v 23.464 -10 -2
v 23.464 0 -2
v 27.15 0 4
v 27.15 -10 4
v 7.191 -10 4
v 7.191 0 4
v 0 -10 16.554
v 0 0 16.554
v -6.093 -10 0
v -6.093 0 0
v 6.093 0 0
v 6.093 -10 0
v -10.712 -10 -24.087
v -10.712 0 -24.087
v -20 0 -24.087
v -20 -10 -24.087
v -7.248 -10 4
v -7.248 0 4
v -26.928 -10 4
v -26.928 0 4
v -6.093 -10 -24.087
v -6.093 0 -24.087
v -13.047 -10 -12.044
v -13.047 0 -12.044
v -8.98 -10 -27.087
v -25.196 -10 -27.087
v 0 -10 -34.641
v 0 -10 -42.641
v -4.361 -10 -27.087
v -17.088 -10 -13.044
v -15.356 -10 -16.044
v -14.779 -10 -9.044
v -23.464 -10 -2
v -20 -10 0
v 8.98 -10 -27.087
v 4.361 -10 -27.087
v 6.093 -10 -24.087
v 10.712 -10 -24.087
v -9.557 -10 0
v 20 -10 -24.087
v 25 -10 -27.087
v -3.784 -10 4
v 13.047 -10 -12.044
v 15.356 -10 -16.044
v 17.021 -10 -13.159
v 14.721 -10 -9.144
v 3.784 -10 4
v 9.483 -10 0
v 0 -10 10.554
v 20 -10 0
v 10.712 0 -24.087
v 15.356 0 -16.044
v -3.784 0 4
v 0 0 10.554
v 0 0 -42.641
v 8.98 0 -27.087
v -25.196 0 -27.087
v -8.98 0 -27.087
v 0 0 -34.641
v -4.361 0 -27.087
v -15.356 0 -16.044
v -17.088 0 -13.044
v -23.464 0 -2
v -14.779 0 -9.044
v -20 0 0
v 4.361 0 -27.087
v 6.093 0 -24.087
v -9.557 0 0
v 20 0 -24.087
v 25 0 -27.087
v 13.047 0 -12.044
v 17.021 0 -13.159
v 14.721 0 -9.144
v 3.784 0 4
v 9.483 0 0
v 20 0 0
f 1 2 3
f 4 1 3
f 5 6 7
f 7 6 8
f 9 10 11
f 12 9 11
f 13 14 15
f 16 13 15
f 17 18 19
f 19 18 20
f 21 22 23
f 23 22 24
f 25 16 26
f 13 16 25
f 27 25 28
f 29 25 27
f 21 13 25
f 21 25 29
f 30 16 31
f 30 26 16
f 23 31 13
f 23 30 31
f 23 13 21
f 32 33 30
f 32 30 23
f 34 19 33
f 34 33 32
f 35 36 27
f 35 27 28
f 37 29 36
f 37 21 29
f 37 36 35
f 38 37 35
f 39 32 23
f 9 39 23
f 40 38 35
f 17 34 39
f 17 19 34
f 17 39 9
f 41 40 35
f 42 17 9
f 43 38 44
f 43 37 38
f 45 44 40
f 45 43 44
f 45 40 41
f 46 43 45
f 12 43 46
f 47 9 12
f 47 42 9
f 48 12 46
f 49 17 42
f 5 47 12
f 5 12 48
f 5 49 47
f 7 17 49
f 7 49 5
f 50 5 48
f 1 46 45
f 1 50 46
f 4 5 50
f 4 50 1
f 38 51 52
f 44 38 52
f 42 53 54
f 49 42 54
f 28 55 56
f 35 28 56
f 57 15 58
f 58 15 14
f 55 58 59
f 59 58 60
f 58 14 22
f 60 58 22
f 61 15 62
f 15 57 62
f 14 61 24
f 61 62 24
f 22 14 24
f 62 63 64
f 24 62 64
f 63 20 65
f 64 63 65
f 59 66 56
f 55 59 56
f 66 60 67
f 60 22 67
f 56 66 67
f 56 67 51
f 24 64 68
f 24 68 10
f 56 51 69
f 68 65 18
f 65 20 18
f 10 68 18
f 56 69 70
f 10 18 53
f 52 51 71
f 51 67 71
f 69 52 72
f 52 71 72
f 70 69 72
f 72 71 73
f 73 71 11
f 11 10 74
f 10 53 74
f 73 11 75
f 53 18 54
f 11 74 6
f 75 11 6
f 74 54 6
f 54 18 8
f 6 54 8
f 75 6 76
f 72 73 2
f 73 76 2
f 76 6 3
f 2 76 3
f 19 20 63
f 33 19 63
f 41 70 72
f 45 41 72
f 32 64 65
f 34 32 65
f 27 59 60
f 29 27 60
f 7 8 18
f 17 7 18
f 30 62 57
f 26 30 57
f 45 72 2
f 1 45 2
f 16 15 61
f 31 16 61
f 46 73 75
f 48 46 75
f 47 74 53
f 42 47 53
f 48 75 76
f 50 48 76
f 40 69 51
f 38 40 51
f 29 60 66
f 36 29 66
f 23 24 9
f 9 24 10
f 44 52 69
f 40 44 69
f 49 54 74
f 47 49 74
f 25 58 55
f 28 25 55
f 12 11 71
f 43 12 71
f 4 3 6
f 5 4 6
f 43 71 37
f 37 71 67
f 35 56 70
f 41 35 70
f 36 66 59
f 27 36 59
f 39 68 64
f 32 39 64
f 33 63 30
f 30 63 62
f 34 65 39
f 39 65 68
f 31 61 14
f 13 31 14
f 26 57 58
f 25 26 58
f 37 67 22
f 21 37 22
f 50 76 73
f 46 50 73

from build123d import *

# Parameters (mm, degrees)
F1_DEPTH = 10


with BuildPart() as f1:
    # F0 (on Front) → F1 (new body)
    with BuildSketch(Plane.XZ):
        Polygon((-10.7119849175, -24.0873143706), (-6.0931825641, -24.0873143706), (-13.046591282, -12.0436571853), (-15.3559924588, -16.0436573585), align=None)
        Polygon((4.3611317565, -27.0873143706), (0, -34.6410161514), (-4.3611317565, -27.0873143706), (-8.9799341099, -27.0873143706), (0, -42.6410164977), (8.9799341099, -27.0873143706), align=None)
        Polygon((13.046591282, -12.0436571853), (6.0931825641, -24.0873143706), (10.7119849175, -24.0873143706), (15.3559924588, -16.0436573585), align=None)
        Polygon((20, 0), (14.7208913197, -9.143684453), (17.0212680072, -13.1593155), (23.4641017651, -2.0000000866), (27.1496195346, 4.00000019), (20, 4.00000019), (7.1914581155, 4.00000019), (9.4828805792, 0), align=None)
        Polygon((-3.7837813776, 4.00000019), (-6.0931825641, 0), (6.0931825641, 0), (3.7837813776, 4.00000019), align=None)
        Polygon((-17.0880432663, -13.0436573585), (-14.7786420896, -9.0436571853), (-20, 0), (-9.5572841792, 0), (-7.2478829927, 4.00000019), (-20, 4.00000019), (-26.9282035399, 4.00000019), (-23.4641017651, -2.0000000866), align=None)
        Polygon((-15.3559924588, -16.0436573585), (-13.046591282, -12.0436571853), (-14.7786420896, -9.0436571853), (-17.0880432663, -13.0436573585), align=None)
        Polygon((-8.9799341099, -27.0873143706), (-4.3611317565, -27.0873143706), (-6.0931825641, -24.0873143706), (-10.7119849175, -24.0873143706), align=None)
        Polygon((6.0931825641, -24.0873143706), (4.3611317565, -27.0873143706), (8.9799341099, -27.0873143706), (10.7119849175, -24.0873143706), align=None)
        Polygon((14.7208913197, -9.143684453), (13.046591282, -12.0436571853), (15.3559924588, -16.0436573585), (17.0212680072, -13.1593155), align=None)
        Polygon((3.7837813776, 4.00000019), (6.0931825641, 0), (9.4828805792, 0), (7.1914581155, 4.00000019), align=None)
        Polygon((-9.5572841792, 0), (-6.0931825641, 0), (-3.7837813776, 4.00000019), (-7.2478829927, 4.00000019), align=None)
        Polygon((-14.7786420896, -9.0436571853), (-13.046591282, -12.0436571853), (-6.0931825641, 0), (-9.5572841792, 0), align=None)
        Polygon((-25.1961524227, -27.0873143706), (-8.9799341099, -27.0873143706), (-10.7119849175, -24.0873143706), (-20, -24.0873143706), (-15.3559924588, -16.0436573585), (-17.0880432663, -13.0436573585), align=None)
        Polygon((-6.0931825641, -24.0873143706), (-4.3611317565, -27.0873143706), (4.3611317565, -27.0873143706), (6.0931825641, -24.0873143706), align=None)
        Polygon((10.7119849175, -24.0873143706), (8.9799341099, -27.0873143706), (25, -27.0873143706), (17.0212680072, -13.1593155), (15.3559924588, -16.0436573585), (20, -24.0873143706), align=None)
        Polygon((6.0931825641, 0), (13.046591282, -12.0436571853), (14.7208913197, -9.143684453), (9.4828805792, 0), align=None)
        Polygon((-7.2478829927, 4.00000019), (-3.7837813776, 4.00000019), (0, 10.5537017807), (3.7837813776, 4.00000019), (7.1914581155, 4.00000019), (0, 16.5537017807), align=None)
    extrude(amount=F1_DEPTH)


solid = f1.part
